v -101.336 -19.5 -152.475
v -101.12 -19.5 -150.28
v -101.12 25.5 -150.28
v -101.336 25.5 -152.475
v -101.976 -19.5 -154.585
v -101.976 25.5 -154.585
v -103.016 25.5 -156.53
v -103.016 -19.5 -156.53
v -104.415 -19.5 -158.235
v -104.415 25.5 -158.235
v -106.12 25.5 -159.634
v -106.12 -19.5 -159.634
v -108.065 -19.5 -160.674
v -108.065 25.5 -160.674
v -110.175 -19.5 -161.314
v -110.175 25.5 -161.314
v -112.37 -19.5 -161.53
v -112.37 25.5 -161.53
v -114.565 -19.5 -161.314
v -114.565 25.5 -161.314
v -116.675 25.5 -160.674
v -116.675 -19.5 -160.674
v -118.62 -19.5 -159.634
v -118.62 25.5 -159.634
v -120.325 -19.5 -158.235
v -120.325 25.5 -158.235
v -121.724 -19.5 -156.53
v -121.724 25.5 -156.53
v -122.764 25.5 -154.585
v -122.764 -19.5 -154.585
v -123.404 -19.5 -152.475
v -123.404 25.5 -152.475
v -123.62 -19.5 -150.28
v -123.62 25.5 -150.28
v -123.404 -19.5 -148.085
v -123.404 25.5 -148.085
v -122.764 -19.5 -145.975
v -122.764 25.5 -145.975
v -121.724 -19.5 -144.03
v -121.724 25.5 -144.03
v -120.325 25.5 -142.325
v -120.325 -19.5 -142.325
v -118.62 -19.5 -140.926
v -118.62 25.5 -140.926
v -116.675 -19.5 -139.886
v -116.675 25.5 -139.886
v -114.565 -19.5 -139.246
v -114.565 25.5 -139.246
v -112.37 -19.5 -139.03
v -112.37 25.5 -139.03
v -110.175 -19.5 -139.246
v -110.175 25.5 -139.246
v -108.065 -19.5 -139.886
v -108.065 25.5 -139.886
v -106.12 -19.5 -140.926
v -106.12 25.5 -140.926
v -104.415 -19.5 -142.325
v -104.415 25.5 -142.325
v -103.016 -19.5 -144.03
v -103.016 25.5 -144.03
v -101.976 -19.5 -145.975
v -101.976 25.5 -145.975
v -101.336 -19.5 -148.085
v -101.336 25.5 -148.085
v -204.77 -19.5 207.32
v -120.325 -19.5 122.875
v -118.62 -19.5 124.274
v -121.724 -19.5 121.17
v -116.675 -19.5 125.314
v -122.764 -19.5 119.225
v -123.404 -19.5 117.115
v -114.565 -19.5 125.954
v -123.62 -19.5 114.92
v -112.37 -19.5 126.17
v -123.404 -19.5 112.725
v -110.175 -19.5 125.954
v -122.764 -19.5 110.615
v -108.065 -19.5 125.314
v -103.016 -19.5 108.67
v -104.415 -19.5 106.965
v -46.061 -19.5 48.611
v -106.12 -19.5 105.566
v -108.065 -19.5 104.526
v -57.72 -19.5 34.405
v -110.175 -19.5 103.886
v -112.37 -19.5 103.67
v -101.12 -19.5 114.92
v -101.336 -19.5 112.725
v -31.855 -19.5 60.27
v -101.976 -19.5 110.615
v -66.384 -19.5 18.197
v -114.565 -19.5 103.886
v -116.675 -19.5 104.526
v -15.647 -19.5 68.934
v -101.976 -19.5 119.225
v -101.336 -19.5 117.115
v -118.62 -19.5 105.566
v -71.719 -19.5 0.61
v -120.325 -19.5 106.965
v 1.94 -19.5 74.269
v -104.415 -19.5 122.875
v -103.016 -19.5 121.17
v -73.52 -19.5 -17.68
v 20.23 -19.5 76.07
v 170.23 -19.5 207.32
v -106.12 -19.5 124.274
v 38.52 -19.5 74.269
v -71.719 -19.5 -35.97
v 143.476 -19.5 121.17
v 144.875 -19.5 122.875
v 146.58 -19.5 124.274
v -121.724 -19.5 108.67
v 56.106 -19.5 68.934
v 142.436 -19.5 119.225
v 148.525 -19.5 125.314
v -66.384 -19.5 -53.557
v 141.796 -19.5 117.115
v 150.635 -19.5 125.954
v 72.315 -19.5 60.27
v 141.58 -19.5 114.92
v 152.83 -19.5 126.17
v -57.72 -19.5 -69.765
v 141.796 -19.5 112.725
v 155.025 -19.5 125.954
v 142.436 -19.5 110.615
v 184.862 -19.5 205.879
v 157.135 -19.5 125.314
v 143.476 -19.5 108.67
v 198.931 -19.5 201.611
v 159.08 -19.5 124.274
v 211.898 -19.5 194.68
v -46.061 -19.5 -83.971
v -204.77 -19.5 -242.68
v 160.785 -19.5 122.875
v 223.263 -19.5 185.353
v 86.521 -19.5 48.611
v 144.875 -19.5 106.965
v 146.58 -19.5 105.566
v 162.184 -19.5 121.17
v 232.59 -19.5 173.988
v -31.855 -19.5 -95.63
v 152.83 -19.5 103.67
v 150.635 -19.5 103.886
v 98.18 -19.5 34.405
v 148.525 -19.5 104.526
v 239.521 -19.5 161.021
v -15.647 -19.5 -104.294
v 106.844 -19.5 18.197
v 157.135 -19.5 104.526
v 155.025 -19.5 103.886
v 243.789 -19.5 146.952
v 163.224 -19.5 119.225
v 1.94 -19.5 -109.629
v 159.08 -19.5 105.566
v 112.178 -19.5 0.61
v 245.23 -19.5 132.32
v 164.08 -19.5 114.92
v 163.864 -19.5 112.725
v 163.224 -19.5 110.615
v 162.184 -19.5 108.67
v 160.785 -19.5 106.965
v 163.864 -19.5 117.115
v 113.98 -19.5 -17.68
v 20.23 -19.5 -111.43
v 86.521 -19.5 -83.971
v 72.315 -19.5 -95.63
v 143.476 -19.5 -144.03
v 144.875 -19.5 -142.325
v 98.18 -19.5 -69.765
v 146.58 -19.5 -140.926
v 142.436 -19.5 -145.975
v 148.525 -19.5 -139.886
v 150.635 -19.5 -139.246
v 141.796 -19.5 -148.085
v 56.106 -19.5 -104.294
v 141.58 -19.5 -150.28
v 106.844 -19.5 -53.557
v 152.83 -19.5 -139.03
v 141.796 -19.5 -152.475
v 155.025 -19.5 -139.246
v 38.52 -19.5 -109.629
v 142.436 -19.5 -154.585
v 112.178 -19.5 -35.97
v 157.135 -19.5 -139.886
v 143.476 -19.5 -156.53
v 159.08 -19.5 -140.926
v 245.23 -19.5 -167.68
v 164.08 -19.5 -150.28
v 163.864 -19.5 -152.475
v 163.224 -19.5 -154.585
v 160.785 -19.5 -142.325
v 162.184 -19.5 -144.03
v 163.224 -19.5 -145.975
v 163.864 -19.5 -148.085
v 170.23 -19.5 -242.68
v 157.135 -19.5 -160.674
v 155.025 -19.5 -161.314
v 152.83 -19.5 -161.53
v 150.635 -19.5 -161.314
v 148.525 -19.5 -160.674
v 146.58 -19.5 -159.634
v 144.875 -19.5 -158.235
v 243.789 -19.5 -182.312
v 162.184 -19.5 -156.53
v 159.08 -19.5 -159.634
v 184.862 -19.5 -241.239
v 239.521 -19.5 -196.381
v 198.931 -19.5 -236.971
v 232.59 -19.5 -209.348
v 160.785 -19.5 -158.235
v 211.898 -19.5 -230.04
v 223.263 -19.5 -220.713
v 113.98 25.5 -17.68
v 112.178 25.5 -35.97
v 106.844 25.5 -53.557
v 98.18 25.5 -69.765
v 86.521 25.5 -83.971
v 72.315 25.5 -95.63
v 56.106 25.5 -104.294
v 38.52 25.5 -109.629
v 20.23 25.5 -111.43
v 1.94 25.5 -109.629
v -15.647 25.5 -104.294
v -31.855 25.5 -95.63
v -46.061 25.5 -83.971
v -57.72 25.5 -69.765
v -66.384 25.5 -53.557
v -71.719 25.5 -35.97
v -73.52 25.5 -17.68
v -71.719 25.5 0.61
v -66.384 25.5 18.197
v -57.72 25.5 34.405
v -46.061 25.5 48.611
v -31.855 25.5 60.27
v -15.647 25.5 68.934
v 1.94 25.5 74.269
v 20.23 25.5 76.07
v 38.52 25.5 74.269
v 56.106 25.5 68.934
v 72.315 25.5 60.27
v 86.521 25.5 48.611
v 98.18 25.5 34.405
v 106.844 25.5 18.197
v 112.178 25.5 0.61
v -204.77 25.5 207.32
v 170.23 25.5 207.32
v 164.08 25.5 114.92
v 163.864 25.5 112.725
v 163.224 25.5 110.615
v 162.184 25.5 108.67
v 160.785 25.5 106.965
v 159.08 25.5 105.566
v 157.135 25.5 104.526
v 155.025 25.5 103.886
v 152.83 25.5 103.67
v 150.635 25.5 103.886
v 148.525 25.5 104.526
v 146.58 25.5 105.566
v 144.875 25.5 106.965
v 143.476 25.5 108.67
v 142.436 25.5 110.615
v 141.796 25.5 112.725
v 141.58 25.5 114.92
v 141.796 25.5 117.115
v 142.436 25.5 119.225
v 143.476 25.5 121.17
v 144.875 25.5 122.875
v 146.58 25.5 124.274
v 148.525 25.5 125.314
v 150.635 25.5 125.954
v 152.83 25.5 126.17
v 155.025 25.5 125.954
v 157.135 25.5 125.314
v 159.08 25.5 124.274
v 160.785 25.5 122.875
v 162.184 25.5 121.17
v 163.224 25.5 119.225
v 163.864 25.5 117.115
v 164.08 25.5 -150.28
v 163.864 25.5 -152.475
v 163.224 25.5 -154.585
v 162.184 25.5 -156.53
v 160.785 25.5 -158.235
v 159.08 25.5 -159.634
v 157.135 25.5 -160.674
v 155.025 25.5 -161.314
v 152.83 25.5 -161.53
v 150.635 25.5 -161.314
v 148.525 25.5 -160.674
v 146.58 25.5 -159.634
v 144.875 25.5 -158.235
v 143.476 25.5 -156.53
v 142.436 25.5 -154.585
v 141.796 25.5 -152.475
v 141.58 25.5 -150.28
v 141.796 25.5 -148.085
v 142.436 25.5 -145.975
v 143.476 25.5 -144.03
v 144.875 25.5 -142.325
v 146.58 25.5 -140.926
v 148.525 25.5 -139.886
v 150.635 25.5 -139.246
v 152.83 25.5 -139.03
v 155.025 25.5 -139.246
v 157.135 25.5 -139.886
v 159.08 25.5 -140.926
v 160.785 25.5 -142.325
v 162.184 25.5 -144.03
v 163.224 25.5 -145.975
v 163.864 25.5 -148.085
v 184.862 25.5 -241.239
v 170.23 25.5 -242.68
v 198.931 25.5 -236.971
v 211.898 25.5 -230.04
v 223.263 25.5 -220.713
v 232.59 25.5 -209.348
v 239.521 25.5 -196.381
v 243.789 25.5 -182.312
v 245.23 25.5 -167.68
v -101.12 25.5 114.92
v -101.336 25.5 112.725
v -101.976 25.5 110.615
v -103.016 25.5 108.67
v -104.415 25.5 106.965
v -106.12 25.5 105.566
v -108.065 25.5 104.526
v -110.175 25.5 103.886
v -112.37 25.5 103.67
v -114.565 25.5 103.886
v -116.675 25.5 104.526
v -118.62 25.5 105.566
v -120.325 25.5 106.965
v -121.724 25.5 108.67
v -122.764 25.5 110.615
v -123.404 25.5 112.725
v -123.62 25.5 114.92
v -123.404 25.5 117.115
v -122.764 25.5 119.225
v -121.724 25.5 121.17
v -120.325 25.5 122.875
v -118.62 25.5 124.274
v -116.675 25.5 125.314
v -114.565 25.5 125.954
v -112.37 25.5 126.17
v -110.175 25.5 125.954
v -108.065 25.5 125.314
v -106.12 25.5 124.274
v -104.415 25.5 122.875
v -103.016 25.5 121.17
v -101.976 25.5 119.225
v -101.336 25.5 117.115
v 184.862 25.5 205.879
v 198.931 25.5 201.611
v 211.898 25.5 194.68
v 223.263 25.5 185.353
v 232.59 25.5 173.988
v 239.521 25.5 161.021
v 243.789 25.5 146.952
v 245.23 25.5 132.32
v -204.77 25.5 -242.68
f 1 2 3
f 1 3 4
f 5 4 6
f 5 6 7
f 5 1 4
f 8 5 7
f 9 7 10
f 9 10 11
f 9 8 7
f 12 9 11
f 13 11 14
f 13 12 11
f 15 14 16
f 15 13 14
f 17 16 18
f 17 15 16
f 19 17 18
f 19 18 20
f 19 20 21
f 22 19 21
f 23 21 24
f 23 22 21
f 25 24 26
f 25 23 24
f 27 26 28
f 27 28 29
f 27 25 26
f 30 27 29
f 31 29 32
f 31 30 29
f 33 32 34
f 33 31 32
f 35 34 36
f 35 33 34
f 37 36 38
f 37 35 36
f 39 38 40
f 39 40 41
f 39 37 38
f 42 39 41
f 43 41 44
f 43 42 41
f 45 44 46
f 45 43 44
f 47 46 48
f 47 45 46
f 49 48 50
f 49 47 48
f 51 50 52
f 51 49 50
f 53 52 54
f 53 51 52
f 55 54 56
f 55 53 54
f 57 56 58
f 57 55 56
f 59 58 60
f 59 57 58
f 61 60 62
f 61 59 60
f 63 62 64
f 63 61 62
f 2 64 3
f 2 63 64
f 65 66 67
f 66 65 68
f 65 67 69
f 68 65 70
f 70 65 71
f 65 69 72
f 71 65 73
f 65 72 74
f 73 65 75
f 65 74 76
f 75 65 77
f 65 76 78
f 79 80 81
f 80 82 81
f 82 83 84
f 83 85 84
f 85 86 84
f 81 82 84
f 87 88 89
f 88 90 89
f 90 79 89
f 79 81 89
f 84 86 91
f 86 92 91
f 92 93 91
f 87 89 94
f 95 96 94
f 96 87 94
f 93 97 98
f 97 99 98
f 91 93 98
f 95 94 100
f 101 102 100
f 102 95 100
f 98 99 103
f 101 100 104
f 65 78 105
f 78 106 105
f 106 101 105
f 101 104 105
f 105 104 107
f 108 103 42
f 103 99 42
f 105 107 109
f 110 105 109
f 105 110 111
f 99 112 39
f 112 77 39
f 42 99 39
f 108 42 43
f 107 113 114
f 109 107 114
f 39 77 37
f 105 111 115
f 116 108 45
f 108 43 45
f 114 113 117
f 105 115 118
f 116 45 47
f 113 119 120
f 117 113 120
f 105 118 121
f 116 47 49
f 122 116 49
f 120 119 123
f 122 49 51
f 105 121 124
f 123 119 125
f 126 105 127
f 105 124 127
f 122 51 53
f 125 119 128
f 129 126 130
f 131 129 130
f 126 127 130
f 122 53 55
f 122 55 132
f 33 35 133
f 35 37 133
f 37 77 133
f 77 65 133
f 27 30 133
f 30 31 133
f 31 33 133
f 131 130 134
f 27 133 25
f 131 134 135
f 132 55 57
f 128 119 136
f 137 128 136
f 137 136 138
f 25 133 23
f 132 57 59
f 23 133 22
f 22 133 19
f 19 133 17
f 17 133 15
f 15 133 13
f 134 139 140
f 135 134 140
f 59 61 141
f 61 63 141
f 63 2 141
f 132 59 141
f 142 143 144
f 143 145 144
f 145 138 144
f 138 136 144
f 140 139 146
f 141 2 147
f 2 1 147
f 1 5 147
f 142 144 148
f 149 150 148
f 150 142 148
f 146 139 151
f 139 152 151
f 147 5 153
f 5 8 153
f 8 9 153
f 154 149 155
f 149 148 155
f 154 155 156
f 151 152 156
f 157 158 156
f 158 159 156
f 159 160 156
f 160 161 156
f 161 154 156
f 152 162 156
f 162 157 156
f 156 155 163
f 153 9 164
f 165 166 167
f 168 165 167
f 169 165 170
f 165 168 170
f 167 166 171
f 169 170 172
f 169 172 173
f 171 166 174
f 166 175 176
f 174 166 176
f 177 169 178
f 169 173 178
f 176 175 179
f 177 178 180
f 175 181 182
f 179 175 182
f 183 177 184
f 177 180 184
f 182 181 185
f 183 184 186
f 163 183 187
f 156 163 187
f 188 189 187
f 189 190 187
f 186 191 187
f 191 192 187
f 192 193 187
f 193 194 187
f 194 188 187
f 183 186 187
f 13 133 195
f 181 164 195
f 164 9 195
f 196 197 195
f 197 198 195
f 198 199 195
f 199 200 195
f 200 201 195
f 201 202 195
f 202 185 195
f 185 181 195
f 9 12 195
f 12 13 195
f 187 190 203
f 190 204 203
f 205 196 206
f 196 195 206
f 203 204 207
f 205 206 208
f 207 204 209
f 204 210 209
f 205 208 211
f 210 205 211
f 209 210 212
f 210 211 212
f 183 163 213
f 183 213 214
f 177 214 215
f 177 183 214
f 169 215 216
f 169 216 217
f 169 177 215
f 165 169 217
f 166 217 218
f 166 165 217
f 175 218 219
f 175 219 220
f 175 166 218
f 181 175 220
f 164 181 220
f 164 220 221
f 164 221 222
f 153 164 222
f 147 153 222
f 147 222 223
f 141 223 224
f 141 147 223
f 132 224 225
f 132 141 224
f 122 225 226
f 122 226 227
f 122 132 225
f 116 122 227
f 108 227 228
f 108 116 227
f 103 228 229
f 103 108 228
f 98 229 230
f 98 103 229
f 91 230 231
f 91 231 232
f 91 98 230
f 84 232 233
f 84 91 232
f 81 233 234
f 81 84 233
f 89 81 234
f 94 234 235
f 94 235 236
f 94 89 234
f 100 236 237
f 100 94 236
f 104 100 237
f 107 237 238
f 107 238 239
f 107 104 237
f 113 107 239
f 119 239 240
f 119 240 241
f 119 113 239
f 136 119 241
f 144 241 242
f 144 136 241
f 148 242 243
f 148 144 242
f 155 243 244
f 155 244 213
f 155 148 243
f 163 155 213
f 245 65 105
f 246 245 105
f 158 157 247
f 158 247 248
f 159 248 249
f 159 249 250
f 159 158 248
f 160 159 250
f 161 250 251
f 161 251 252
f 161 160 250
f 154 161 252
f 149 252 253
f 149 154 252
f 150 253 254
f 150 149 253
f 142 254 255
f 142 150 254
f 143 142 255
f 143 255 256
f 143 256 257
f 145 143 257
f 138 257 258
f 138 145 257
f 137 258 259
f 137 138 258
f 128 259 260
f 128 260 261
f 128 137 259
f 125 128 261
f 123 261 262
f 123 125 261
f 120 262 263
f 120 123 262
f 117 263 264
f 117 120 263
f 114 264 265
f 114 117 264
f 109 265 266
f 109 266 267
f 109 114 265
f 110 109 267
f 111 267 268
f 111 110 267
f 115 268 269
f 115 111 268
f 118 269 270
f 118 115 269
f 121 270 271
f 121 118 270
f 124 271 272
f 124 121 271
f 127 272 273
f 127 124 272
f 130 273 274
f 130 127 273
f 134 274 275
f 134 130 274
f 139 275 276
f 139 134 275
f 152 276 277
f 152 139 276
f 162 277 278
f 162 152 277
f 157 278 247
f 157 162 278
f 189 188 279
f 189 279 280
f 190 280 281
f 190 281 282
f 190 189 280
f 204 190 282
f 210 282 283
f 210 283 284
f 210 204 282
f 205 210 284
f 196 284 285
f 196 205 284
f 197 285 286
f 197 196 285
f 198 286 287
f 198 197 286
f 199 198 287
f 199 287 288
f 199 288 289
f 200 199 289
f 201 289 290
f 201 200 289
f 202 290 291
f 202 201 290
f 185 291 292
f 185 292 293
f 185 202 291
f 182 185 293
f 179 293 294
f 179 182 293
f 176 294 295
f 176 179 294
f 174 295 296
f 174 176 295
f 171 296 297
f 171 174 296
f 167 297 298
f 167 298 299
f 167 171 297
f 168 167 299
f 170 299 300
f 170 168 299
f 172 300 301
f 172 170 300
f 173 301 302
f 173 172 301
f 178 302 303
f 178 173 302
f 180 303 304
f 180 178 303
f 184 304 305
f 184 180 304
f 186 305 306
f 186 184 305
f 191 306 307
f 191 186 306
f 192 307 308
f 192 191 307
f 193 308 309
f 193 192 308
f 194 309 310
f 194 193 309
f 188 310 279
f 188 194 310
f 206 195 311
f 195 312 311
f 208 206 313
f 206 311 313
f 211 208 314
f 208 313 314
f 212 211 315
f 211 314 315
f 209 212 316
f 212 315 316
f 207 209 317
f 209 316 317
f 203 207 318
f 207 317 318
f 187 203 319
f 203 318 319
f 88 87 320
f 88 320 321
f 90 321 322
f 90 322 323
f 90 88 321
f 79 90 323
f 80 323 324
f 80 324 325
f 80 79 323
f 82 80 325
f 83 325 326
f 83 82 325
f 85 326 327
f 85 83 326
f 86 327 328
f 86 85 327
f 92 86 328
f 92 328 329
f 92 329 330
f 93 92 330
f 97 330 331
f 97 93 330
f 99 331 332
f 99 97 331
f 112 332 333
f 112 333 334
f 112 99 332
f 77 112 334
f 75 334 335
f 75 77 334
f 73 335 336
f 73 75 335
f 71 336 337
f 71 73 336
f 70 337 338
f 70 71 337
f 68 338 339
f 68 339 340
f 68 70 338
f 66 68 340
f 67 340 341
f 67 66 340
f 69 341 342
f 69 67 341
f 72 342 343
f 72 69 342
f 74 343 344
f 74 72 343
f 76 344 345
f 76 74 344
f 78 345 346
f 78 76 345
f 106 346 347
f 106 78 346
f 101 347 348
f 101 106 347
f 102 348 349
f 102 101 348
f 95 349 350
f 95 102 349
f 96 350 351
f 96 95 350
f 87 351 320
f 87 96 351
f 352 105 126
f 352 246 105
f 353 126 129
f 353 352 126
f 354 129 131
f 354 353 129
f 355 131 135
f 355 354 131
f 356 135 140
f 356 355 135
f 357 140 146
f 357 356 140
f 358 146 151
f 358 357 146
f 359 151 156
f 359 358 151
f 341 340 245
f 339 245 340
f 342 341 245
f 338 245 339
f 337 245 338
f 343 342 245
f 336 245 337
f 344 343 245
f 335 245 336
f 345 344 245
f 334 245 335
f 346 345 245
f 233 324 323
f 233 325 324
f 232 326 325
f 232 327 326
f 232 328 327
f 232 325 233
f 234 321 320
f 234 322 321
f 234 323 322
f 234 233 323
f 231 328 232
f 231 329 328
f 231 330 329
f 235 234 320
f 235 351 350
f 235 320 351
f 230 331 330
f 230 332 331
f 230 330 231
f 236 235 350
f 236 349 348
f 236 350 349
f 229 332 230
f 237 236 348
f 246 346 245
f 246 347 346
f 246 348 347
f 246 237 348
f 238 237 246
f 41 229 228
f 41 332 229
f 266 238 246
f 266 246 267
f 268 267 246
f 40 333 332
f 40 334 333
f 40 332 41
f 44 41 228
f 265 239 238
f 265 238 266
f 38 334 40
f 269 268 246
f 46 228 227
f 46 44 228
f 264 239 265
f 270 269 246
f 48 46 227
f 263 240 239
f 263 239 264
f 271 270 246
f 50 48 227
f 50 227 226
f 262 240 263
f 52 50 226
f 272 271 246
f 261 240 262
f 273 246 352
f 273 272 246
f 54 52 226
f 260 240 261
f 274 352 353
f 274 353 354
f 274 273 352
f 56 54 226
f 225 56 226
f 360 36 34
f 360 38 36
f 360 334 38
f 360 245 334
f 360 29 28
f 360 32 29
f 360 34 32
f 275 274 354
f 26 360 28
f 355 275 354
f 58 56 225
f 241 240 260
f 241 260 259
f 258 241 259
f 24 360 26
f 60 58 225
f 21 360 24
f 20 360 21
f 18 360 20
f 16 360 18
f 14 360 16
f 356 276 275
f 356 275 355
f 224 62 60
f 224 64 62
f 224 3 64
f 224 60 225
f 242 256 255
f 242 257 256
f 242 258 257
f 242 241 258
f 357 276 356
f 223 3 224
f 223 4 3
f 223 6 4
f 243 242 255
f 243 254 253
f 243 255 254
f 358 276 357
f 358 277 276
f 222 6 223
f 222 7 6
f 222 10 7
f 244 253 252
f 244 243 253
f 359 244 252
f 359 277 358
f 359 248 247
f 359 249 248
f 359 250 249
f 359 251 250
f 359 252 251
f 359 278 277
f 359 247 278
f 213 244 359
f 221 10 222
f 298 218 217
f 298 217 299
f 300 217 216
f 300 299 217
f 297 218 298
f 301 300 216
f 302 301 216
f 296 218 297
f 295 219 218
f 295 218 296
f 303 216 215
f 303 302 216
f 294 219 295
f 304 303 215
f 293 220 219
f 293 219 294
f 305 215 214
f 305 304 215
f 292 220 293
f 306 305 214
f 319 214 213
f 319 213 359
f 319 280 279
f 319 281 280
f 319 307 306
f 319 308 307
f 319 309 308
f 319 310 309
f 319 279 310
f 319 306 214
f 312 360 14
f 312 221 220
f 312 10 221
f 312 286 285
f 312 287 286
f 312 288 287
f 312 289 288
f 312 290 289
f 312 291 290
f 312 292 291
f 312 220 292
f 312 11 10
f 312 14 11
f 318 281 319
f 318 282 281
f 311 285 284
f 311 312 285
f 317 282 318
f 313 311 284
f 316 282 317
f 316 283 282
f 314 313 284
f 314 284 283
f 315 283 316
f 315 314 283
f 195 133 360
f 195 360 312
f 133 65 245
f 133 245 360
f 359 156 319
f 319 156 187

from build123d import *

# Parameters (mm, degrees)
SKETCH1_W           = 60
SKETCH1_H           = 60
SKETCH1_R           = 1.5
SKETCH1_R_2         = 12.5
BOSS_EXTRUDE1_DEPTH = 6
FILLET1_R           = 10
SCALE2_SCALE        = 7.5


with BuildPart() as part:
    # Sketch1 → Boss-Extrude1 (new body)
    with BuildSketch(Plane(origin=(0, 0, 0), x_dir=(1, 0, 0), z_dir=(0, 1, 0))):
        with Locations((17.68, 17.68)):
            Rectangle(SKETCH1_W, SKETCH1_H)
        with Locations((0, 35.36)):
            Circle(SKETCH1_R, mode=Mode.SUBTRACT)
        with Locations((35.36, 35.36)):
            Circle(SKETCH1_R, mode=Mode.SUBTRACT)
        with Locations((35.36, 0)):
            Circle(SKETCH1_R, mode=Mode.SUBTRACT)
        Circle(SKETCH1_R, mode=Mode.SUBTRACT)
        with Locations((17.68, 17.68)):
            Circle(SKETCH1_R_2, mode=Mode.SUBTRACT)
    extrude(amount=BOSS_EXTRUDE1_DEPTH)

    # Fillet1
    fillet1_edges = [part.edges().sort_by_distance(p)[0] for p in [
        (47.68, 3, -47.68),
        (47.68, 3, 12.32),
    ]]
    fillet(fillet1_edges, radius=FILLET1_R)


with BuildPart() as part_1:
    # Scale2: scaled about (17.28771311, 3, -17.68)
    add(part.part.scale(SCALE2_SCALE).moved(Location((-112.370135215, -19.5, 114.92))))


solid = part_1.part
